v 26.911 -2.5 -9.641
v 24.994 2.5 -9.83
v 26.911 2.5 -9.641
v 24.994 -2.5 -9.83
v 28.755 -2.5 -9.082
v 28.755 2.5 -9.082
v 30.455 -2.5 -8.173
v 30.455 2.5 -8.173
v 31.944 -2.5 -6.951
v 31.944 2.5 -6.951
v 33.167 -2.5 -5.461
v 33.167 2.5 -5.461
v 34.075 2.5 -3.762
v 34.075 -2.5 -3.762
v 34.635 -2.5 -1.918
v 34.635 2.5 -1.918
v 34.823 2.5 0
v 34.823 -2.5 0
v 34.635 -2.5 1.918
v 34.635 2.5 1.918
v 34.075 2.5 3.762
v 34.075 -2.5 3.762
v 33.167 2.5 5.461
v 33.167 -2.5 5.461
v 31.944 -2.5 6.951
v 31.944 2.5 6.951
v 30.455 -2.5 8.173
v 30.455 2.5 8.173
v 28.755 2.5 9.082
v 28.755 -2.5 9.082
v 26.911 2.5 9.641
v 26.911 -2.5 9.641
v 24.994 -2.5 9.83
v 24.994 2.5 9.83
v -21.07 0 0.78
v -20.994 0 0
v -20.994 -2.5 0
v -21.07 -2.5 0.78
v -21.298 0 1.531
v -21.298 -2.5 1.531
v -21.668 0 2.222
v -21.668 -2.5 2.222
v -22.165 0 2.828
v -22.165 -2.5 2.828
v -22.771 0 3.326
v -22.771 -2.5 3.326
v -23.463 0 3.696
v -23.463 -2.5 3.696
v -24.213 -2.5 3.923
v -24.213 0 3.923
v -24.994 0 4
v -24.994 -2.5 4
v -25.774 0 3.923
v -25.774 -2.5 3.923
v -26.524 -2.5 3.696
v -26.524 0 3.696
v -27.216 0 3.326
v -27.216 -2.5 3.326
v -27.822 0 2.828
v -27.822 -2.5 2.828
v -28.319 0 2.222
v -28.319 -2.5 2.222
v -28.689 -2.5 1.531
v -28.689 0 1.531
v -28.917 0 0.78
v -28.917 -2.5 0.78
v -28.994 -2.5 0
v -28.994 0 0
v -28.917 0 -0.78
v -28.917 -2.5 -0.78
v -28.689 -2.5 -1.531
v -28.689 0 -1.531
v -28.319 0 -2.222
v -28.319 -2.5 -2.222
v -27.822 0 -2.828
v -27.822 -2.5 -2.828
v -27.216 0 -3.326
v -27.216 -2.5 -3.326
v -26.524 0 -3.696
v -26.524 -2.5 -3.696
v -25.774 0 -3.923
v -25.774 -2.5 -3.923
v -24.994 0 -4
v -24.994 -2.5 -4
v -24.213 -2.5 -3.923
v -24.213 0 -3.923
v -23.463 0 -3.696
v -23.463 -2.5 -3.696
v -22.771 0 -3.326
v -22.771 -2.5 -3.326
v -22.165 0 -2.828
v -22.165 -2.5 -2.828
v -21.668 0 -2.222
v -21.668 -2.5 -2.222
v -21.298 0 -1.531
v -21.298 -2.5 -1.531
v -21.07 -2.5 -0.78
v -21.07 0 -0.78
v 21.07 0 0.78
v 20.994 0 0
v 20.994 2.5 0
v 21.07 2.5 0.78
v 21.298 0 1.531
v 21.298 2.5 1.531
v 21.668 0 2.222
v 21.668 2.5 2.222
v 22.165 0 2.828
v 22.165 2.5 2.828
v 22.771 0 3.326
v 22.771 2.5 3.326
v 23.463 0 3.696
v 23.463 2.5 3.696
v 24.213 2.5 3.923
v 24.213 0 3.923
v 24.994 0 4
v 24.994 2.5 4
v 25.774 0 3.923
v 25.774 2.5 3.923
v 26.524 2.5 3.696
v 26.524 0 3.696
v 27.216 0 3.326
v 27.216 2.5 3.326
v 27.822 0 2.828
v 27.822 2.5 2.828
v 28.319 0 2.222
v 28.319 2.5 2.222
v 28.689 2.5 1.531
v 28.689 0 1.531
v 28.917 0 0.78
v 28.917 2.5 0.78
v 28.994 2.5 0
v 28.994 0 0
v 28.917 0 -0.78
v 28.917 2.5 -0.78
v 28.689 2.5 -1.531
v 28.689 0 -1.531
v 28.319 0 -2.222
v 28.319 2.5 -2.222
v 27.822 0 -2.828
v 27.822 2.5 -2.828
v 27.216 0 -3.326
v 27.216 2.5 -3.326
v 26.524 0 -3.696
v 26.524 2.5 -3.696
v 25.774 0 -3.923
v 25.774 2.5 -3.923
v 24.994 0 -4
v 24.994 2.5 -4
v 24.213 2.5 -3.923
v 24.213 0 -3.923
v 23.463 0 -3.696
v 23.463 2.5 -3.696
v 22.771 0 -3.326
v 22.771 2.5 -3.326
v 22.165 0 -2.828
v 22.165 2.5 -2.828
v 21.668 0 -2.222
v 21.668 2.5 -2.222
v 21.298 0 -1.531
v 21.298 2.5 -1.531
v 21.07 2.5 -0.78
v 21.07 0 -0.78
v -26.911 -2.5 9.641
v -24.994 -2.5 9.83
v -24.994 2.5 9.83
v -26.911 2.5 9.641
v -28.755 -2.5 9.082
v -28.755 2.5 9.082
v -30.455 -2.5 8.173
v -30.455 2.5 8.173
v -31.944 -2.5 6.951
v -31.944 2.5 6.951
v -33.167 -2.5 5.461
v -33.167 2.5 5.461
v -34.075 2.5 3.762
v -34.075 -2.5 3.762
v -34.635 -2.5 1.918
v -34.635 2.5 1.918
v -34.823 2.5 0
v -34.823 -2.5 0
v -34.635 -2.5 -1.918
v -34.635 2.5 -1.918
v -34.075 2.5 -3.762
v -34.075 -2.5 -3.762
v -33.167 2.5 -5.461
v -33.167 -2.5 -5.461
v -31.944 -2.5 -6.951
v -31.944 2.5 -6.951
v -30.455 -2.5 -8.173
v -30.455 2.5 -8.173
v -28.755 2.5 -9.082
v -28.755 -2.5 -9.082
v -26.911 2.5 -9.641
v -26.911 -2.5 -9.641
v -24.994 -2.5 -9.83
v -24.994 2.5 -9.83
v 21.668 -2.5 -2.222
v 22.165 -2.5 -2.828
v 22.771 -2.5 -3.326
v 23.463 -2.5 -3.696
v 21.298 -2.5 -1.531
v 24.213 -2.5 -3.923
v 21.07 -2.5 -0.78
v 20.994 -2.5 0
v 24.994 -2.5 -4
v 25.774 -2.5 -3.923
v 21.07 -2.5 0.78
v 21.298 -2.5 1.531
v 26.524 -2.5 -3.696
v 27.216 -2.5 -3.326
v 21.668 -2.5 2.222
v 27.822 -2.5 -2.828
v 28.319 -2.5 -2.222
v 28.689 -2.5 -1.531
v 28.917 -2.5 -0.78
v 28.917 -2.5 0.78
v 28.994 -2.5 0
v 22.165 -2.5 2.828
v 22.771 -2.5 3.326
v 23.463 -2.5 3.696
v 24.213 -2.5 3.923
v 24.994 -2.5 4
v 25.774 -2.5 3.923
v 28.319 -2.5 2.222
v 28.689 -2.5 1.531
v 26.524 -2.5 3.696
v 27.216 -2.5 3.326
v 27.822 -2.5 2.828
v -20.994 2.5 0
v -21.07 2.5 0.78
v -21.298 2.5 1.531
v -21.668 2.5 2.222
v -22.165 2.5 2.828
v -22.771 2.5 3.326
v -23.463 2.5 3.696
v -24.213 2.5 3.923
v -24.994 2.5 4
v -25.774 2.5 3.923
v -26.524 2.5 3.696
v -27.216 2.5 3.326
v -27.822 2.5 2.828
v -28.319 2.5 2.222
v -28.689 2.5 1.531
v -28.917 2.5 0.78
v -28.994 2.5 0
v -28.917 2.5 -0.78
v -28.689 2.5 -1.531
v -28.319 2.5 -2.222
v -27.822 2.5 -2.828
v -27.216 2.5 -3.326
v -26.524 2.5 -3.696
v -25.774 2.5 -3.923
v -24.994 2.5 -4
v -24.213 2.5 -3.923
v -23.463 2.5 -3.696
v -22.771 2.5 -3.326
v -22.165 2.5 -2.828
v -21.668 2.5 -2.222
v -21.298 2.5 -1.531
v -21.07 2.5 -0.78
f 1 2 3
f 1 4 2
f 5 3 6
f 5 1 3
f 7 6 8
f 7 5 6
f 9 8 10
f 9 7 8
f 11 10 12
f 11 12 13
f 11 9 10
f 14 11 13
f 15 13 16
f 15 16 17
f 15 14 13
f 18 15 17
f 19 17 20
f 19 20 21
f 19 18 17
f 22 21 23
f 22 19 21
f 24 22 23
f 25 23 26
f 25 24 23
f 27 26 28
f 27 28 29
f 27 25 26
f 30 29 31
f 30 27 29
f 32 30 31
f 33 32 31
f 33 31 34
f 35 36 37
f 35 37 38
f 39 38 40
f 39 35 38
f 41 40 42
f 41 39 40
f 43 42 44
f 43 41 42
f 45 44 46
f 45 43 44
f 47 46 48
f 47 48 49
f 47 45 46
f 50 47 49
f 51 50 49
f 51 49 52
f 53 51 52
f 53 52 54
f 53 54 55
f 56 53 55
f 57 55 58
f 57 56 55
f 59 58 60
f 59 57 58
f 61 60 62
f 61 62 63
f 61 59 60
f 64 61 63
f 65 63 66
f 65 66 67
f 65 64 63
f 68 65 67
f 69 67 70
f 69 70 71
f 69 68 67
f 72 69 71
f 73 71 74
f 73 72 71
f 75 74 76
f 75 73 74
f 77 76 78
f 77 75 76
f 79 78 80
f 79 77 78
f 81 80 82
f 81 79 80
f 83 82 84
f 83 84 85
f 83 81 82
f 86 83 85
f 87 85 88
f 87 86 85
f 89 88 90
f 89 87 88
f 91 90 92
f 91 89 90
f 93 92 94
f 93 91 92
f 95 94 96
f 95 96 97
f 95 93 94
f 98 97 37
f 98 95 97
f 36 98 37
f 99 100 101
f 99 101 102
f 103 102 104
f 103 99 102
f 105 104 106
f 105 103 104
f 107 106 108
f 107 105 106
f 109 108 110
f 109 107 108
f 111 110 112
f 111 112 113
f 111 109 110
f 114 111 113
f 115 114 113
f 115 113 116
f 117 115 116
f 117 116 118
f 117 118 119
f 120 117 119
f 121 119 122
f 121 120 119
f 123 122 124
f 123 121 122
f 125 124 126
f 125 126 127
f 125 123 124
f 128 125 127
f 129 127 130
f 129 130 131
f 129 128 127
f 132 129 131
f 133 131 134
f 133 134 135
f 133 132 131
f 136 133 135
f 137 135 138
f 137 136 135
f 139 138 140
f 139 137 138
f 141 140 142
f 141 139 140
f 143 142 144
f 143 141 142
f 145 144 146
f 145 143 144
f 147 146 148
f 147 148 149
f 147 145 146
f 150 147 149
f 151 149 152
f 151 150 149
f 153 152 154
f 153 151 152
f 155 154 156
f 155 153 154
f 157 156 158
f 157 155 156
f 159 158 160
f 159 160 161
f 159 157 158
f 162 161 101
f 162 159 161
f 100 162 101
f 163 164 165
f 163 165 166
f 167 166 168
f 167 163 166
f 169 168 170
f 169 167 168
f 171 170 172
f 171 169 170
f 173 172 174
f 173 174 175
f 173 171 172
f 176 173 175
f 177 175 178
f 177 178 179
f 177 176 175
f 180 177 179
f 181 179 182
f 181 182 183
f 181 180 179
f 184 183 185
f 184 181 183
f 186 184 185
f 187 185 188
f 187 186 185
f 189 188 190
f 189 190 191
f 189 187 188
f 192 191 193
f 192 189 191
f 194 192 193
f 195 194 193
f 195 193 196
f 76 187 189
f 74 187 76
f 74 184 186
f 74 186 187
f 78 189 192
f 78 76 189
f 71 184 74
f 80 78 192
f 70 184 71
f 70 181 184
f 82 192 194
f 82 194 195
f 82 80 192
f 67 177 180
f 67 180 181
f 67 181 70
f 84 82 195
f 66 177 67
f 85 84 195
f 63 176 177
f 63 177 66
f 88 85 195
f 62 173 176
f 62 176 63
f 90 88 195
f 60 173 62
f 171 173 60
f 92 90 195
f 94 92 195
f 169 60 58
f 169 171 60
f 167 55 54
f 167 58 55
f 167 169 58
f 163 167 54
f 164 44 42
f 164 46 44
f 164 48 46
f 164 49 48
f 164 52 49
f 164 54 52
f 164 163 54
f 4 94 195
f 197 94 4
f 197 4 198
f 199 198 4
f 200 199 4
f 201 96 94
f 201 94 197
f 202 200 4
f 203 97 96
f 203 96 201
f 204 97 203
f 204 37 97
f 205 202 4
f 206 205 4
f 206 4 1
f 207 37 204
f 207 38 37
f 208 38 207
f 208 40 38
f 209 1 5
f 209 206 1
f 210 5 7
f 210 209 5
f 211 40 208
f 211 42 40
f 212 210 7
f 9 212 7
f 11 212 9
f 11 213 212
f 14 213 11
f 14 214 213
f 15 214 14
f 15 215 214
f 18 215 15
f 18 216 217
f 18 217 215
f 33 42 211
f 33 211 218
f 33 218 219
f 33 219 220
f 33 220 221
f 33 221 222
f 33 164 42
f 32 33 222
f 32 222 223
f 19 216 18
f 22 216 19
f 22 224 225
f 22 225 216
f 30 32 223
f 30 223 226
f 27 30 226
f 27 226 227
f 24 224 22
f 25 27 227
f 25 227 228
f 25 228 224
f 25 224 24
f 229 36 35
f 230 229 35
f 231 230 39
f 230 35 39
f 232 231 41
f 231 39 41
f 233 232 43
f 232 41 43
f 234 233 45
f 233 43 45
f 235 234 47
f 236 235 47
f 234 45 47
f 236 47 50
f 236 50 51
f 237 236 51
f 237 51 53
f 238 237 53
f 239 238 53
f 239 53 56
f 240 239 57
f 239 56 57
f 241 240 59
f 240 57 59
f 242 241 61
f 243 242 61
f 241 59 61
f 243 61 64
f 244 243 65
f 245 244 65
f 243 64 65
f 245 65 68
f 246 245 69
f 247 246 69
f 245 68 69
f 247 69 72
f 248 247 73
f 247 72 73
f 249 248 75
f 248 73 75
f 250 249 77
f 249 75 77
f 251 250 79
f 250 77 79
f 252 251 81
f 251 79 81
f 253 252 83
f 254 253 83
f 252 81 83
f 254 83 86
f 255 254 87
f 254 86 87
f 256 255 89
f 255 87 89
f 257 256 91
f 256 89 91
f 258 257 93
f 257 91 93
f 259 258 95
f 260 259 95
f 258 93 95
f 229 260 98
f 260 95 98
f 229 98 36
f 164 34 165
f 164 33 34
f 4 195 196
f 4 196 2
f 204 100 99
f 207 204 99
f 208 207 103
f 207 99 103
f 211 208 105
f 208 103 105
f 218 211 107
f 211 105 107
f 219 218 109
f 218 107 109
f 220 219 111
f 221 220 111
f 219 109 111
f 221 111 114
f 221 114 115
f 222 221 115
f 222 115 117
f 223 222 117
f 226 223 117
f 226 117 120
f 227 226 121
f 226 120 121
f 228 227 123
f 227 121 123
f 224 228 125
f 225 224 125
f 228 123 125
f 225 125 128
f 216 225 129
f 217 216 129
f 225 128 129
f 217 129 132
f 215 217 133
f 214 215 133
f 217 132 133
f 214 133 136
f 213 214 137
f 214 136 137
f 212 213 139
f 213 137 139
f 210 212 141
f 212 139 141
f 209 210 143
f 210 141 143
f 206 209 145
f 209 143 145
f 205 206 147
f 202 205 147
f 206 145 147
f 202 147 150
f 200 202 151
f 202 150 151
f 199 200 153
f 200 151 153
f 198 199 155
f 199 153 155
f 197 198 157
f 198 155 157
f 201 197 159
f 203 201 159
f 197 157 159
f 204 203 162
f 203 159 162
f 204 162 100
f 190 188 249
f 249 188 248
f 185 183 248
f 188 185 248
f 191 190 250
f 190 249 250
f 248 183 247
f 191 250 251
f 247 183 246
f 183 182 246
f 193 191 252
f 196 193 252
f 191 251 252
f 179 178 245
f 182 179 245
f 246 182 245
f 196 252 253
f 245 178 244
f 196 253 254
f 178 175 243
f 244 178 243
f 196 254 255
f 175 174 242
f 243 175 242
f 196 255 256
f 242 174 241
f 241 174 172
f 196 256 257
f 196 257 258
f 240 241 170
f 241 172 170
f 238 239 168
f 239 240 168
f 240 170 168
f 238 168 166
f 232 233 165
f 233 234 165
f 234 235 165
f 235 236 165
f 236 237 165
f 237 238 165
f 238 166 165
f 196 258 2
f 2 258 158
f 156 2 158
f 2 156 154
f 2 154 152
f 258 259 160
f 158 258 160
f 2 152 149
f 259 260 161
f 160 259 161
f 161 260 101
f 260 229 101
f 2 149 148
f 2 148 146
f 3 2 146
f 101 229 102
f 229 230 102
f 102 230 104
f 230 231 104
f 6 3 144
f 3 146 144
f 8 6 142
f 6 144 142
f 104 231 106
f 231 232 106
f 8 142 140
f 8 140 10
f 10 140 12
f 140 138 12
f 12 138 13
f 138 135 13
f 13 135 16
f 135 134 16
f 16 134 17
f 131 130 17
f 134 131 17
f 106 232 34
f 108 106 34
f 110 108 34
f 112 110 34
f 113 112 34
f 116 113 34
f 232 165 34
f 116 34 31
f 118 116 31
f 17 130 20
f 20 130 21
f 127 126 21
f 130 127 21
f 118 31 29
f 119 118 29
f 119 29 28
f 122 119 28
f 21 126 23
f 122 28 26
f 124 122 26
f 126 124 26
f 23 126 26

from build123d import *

# Parameters (mm, degrees)
F0_R     = 4
F1_DEPTH = 2.5


with BuildPart() as f1:
    # F0 (on Front) → F1 (new body, symmetric)
    with BuildSketch(Plane.XZ):
        with BuildLine():
            Line((24.9936, 9.8298), (0, 9.8298))
            Line((0, 9.8298), (-24.9936, 9.8298))
            ThreePointArc((-24.9936, 9.8298), (-34.8234, 0), (-24.9936, -9.8298))
            Line((-24.9936, -9.8298), (0, -9.8298))
            Line((0, -9.8298), (24.9936, -9.8298))
            ThreePointArc((24.9936, -9.8298), (34.8234, 0), (24.9936, 9.8298))
        make_face()
        with Locations((-24.9936, 0)):
            Circle(F0_R, mode=Mode.SUBTRACT)
        with BuildLine():
            ThreePointArc((28.9936, 0), (24.9936, -4), (20.9936, 0))
            ThreePointArc((20.9936, 0), (24.9936, 4), (28.9936, 0))
        make_face(mode=Mode.SUBTRACT)
    extrude(amount=F1_DEPTH, both=True)


solid = f1.part
